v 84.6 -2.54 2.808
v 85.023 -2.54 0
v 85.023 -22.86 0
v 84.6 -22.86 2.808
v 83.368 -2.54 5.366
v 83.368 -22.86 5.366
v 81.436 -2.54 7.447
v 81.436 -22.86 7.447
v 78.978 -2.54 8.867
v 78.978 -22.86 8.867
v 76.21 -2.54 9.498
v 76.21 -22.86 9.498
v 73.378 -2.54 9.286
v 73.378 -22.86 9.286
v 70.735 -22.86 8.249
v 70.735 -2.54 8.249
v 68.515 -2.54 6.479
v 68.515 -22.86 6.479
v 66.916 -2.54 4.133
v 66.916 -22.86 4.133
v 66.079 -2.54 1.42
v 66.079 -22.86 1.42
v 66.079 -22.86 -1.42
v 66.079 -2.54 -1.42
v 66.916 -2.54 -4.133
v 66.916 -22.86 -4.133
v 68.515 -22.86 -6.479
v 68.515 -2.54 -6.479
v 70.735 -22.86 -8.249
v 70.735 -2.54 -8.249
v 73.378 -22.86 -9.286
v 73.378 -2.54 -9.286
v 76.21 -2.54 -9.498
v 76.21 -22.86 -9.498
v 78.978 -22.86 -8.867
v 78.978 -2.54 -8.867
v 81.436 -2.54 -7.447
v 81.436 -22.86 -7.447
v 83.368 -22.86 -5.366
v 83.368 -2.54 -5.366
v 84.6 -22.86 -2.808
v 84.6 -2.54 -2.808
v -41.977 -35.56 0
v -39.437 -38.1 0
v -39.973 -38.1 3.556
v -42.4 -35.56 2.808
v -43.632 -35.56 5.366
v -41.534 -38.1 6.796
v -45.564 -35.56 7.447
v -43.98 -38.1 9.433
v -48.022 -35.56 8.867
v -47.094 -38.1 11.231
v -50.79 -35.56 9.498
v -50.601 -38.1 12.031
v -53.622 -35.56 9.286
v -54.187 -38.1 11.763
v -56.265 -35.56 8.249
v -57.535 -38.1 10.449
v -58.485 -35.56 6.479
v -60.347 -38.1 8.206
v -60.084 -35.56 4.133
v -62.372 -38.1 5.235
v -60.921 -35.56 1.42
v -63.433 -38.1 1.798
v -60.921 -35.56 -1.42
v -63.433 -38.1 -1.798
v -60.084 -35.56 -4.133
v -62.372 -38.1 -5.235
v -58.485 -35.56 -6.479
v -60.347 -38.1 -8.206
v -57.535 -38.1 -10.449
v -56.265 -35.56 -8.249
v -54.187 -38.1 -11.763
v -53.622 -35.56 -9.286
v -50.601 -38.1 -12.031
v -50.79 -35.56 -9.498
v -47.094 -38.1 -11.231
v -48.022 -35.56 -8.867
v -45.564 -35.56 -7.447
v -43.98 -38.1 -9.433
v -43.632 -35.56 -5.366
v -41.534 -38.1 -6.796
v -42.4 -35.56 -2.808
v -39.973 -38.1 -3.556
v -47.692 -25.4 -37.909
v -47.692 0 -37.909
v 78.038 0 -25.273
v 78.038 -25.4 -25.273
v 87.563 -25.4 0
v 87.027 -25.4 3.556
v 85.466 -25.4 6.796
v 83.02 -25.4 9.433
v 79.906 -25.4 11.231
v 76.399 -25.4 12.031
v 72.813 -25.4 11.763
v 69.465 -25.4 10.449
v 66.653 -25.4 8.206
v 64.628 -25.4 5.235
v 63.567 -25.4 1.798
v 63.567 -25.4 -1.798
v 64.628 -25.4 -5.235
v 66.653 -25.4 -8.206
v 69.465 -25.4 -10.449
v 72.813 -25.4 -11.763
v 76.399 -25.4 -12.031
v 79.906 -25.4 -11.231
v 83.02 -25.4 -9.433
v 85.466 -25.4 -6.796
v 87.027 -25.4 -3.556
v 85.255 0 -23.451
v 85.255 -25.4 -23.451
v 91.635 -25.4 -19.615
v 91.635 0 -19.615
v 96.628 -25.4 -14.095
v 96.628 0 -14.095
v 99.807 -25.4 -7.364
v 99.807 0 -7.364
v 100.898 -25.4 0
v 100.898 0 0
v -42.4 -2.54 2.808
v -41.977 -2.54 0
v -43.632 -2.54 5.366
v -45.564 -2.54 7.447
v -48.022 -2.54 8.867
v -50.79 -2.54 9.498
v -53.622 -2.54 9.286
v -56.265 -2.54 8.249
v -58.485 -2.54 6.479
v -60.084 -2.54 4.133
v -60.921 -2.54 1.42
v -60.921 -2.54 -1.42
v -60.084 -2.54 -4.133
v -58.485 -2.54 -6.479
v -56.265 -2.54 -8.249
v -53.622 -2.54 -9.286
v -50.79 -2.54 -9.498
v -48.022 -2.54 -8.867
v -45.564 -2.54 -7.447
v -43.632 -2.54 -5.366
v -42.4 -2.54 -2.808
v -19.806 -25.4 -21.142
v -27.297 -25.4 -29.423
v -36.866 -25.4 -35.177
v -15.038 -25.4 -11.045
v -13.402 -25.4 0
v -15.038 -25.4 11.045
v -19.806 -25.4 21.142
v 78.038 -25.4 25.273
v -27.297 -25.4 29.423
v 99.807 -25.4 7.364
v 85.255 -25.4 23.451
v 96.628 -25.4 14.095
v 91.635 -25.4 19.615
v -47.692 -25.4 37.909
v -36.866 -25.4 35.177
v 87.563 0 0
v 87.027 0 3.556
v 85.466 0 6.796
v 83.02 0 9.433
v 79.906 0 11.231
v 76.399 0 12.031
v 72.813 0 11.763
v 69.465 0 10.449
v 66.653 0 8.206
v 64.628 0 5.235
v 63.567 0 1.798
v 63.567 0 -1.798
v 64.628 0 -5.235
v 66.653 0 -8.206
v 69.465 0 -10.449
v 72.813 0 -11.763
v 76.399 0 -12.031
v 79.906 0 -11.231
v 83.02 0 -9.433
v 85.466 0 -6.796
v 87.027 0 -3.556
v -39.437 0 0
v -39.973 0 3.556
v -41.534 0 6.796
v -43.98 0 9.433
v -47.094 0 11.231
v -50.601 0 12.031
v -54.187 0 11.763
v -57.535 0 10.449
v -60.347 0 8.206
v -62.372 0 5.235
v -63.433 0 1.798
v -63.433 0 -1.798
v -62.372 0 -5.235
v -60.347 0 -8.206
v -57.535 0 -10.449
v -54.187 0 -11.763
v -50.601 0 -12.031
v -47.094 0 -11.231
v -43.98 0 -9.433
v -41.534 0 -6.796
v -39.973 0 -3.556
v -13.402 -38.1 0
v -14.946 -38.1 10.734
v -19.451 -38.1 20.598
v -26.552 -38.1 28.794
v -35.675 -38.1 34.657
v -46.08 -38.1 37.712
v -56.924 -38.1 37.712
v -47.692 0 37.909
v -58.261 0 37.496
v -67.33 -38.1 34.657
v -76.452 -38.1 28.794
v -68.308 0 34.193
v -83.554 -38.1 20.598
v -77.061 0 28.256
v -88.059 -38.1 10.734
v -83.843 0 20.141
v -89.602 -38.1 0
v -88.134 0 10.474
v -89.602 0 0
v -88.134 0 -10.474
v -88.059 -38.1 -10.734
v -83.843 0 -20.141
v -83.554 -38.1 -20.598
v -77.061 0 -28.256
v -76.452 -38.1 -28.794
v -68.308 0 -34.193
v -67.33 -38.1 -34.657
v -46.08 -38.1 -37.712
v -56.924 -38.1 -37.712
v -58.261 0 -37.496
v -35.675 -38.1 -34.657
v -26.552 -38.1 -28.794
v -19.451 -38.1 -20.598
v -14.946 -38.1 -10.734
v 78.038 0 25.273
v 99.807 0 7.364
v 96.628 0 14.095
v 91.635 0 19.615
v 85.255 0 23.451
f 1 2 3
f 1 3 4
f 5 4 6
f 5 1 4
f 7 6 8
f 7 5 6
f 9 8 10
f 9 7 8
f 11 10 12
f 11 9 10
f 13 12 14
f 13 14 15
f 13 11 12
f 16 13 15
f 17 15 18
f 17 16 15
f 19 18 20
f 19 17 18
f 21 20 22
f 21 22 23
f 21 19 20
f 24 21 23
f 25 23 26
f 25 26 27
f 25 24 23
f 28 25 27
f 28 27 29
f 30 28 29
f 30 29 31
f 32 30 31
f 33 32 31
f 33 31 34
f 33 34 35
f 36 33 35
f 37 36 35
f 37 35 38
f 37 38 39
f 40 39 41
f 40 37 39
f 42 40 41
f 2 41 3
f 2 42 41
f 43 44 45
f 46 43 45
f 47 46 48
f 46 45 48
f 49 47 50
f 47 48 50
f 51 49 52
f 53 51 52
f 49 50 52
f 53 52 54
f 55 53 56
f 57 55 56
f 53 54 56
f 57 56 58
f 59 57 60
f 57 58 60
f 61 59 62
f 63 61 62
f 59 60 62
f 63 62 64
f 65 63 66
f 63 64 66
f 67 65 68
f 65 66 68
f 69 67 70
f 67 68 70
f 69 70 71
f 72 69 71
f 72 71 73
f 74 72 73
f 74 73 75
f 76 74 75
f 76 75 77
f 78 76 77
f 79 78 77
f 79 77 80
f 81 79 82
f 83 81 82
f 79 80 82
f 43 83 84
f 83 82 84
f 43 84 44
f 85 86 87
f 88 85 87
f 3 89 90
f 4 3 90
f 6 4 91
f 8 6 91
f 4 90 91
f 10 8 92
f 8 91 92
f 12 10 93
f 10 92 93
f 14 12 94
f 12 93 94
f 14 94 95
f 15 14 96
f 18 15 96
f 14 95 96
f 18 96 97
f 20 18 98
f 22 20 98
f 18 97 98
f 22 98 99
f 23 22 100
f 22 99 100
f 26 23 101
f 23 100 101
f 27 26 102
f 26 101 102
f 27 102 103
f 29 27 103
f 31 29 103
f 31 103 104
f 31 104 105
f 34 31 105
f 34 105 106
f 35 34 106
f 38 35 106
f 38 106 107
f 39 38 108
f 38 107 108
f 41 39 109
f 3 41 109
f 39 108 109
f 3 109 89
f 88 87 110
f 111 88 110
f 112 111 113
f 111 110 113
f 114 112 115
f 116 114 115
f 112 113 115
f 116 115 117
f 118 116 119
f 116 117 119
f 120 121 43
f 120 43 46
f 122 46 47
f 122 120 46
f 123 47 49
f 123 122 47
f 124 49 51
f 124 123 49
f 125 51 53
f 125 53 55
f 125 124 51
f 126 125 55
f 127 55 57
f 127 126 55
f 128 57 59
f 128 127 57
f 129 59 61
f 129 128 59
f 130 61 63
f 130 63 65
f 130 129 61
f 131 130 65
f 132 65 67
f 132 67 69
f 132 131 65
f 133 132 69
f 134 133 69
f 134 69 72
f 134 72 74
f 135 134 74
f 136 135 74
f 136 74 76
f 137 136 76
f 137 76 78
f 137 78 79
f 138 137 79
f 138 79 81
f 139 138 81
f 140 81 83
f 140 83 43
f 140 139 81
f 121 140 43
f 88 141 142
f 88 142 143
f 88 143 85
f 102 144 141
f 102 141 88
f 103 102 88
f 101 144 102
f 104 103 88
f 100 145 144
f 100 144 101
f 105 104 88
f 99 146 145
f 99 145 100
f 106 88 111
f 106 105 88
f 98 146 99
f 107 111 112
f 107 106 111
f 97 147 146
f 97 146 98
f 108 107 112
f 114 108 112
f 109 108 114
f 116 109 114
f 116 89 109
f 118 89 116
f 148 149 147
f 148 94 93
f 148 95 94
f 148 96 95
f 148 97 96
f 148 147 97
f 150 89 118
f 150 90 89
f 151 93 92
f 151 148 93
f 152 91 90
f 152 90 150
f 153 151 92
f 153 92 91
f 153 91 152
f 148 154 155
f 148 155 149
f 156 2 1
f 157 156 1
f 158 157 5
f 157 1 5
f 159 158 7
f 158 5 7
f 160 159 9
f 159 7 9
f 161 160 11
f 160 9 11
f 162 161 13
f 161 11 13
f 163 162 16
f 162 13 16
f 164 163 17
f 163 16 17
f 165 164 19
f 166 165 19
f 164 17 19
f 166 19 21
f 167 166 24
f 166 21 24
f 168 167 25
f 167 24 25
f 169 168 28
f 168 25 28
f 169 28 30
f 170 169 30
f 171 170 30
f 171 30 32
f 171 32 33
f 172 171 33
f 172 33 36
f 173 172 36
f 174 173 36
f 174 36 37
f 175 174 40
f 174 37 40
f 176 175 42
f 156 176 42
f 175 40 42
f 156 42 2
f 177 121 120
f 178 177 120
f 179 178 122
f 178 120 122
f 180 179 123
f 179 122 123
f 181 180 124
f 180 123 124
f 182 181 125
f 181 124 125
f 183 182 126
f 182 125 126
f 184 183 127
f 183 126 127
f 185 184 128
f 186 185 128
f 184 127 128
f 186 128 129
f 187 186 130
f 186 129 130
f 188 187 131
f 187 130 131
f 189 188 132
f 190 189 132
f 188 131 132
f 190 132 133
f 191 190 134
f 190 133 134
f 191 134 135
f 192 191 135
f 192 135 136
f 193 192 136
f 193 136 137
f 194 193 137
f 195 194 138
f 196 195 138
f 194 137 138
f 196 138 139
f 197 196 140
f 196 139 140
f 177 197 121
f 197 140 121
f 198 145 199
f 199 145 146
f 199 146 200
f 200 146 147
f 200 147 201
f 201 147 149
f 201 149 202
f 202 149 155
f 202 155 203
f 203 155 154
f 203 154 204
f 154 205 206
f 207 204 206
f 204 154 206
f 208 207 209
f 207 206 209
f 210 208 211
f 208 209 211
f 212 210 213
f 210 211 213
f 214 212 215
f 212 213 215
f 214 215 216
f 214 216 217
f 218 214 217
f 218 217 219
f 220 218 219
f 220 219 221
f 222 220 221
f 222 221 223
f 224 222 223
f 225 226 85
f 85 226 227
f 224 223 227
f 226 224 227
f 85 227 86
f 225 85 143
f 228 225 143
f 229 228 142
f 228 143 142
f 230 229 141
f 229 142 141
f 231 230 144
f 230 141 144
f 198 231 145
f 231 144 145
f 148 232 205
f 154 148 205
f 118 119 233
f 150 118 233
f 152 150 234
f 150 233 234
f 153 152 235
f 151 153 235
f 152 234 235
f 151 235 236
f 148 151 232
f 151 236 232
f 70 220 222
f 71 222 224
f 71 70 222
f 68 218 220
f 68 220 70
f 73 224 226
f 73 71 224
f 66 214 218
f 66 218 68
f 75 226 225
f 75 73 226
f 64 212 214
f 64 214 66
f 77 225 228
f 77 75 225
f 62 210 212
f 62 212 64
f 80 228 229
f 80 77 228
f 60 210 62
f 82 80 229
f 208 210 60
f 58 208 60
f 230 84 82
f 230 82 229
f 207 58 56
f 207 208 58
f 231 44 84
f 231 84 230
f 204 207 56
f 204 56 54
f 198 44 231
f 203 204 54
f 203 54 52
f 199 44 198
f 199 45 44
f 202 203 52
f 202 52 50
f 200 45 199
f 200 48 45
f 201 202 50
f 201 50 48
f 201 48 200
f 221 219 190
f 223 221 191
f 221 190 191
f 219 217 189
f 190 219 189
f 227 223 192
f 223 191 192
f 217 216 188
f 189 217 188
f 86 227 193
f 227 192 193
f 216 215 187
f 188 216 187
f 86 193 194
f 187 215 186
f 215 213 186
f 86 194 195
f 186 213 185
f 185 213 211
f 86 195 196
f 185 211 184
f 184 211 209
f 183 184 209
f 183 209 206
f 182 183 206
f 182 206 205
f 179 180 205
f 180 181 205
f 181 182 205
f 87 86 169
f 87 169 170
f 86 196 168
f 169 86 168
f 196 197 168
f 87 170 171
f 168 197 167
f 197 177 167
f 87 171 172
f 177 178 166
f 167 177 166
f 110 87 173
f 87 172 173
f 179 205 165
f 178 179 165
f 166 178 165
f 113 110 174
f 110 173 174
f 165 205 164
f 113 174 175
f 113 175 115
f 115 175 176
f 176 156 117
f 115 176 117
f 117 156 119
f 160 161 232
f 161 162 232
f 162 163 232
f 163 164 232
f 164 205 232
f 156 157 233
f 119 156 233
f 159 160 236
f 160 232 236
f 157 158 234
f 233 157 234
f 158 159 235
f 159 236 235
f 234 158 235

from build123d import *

# Parameters (mm, degrees)
F1_R     = 9.525
F2_DEPTH = 25.4
F0_R     = 38.1
F0_R_2   = 9.525
F3_DEPTH = 38.1
F4_SIZE  = 2.54


with BuildPart() as f2:
    # F1 (on face) → F2 (new body)
    with BuildSketch(Plane.XZ):
        with BuildLine():
            ThreePointArc((-13.4022655529, 0), (-23.2465491404, 25.5582567875), (-47.6922650288, 37.9090213011))
            ThreePointArc((-47.6922650288, 37.9090213011), (-89.6022655529, 2.206e-07), (-47.6922654678, -37.9090213452))
            ThreePointArc((-47.6922654678, -37.9090213452), (-23.2465492884, -25.5582569511), (-13.4022655529, 0))
        make_face()
        with Locations((-51.5022655529, 0)):
            Circle(F1_R, mode=Mode.SUBTRACT)
        with BuildLine():
            Line((78.0377345258, 25.2726808946), (-47.6922650288, 37.9090213011))
            ThreePointArc((-47.6922650288, 37.9090213011), (-23.2465491404, 25.5582567875), (-13.4022655529, 0))
            ThreePointArc((-13.4022655529, 0), (-23.2465492884, -25.5582569511), (-47.6922654678, -37.9090213452))
            Line((-47.6922654678, -37.9090213452), (78.0377338702, -25.2726809605))
            ThreePointArc((78.0377338702, -25.2726809605), (50.0977344471, 3.295e-07), (78.0377345258, 25.2726808946))
        make_face()
        with BuildLine():
            ThreePointArc((100.8977344471, 0), (94.3348786309, 17.0388379592), (78.0377345258, 25.2726808946))
            ThreePointArc((78.0377345258, 25.2726808946), (50.0977344471, 3.295e-07), (78.0377338702, -25.2726809605))
            ThreePointArc((78.0377338702, -25.2726809605), (94.3348784099, -17.0388382036), (100.8977344471, 0))
        make_face()
        with Locations((75.4977344471, 0)):
            Circle(F1_R, mode=Mode.SUBTRACT)
    extrude(amount=F2_DEPTH)

    # F0 (on Front) → F3 (join)
    with BuildSketch(Plane.XZ):
        with Locations((-51.5022655529, 0)):
            Circle(F0_R)
        with Locations((-51.5022655529, 0)):
            Circle(F0_R_2, mode=Mode.SUBTRACT)
    extrude(amount=F3_DEPTH)

    # F4
    f4_edges = [f2.edges().sort_by_distance(p)[0] for p in [
        (85.022734, -12.7, 0),
        (65.972734, 0, 0),
        (65.972734, -25.4, 0),
        (-61.027266, 0, 0),
        (-41.977266, -19.05, 0),
        (-61.027266, -38.1, 0),
    ]]
    chamfer(f4_edges, length=F4_SIZE)


solid = f2.part
